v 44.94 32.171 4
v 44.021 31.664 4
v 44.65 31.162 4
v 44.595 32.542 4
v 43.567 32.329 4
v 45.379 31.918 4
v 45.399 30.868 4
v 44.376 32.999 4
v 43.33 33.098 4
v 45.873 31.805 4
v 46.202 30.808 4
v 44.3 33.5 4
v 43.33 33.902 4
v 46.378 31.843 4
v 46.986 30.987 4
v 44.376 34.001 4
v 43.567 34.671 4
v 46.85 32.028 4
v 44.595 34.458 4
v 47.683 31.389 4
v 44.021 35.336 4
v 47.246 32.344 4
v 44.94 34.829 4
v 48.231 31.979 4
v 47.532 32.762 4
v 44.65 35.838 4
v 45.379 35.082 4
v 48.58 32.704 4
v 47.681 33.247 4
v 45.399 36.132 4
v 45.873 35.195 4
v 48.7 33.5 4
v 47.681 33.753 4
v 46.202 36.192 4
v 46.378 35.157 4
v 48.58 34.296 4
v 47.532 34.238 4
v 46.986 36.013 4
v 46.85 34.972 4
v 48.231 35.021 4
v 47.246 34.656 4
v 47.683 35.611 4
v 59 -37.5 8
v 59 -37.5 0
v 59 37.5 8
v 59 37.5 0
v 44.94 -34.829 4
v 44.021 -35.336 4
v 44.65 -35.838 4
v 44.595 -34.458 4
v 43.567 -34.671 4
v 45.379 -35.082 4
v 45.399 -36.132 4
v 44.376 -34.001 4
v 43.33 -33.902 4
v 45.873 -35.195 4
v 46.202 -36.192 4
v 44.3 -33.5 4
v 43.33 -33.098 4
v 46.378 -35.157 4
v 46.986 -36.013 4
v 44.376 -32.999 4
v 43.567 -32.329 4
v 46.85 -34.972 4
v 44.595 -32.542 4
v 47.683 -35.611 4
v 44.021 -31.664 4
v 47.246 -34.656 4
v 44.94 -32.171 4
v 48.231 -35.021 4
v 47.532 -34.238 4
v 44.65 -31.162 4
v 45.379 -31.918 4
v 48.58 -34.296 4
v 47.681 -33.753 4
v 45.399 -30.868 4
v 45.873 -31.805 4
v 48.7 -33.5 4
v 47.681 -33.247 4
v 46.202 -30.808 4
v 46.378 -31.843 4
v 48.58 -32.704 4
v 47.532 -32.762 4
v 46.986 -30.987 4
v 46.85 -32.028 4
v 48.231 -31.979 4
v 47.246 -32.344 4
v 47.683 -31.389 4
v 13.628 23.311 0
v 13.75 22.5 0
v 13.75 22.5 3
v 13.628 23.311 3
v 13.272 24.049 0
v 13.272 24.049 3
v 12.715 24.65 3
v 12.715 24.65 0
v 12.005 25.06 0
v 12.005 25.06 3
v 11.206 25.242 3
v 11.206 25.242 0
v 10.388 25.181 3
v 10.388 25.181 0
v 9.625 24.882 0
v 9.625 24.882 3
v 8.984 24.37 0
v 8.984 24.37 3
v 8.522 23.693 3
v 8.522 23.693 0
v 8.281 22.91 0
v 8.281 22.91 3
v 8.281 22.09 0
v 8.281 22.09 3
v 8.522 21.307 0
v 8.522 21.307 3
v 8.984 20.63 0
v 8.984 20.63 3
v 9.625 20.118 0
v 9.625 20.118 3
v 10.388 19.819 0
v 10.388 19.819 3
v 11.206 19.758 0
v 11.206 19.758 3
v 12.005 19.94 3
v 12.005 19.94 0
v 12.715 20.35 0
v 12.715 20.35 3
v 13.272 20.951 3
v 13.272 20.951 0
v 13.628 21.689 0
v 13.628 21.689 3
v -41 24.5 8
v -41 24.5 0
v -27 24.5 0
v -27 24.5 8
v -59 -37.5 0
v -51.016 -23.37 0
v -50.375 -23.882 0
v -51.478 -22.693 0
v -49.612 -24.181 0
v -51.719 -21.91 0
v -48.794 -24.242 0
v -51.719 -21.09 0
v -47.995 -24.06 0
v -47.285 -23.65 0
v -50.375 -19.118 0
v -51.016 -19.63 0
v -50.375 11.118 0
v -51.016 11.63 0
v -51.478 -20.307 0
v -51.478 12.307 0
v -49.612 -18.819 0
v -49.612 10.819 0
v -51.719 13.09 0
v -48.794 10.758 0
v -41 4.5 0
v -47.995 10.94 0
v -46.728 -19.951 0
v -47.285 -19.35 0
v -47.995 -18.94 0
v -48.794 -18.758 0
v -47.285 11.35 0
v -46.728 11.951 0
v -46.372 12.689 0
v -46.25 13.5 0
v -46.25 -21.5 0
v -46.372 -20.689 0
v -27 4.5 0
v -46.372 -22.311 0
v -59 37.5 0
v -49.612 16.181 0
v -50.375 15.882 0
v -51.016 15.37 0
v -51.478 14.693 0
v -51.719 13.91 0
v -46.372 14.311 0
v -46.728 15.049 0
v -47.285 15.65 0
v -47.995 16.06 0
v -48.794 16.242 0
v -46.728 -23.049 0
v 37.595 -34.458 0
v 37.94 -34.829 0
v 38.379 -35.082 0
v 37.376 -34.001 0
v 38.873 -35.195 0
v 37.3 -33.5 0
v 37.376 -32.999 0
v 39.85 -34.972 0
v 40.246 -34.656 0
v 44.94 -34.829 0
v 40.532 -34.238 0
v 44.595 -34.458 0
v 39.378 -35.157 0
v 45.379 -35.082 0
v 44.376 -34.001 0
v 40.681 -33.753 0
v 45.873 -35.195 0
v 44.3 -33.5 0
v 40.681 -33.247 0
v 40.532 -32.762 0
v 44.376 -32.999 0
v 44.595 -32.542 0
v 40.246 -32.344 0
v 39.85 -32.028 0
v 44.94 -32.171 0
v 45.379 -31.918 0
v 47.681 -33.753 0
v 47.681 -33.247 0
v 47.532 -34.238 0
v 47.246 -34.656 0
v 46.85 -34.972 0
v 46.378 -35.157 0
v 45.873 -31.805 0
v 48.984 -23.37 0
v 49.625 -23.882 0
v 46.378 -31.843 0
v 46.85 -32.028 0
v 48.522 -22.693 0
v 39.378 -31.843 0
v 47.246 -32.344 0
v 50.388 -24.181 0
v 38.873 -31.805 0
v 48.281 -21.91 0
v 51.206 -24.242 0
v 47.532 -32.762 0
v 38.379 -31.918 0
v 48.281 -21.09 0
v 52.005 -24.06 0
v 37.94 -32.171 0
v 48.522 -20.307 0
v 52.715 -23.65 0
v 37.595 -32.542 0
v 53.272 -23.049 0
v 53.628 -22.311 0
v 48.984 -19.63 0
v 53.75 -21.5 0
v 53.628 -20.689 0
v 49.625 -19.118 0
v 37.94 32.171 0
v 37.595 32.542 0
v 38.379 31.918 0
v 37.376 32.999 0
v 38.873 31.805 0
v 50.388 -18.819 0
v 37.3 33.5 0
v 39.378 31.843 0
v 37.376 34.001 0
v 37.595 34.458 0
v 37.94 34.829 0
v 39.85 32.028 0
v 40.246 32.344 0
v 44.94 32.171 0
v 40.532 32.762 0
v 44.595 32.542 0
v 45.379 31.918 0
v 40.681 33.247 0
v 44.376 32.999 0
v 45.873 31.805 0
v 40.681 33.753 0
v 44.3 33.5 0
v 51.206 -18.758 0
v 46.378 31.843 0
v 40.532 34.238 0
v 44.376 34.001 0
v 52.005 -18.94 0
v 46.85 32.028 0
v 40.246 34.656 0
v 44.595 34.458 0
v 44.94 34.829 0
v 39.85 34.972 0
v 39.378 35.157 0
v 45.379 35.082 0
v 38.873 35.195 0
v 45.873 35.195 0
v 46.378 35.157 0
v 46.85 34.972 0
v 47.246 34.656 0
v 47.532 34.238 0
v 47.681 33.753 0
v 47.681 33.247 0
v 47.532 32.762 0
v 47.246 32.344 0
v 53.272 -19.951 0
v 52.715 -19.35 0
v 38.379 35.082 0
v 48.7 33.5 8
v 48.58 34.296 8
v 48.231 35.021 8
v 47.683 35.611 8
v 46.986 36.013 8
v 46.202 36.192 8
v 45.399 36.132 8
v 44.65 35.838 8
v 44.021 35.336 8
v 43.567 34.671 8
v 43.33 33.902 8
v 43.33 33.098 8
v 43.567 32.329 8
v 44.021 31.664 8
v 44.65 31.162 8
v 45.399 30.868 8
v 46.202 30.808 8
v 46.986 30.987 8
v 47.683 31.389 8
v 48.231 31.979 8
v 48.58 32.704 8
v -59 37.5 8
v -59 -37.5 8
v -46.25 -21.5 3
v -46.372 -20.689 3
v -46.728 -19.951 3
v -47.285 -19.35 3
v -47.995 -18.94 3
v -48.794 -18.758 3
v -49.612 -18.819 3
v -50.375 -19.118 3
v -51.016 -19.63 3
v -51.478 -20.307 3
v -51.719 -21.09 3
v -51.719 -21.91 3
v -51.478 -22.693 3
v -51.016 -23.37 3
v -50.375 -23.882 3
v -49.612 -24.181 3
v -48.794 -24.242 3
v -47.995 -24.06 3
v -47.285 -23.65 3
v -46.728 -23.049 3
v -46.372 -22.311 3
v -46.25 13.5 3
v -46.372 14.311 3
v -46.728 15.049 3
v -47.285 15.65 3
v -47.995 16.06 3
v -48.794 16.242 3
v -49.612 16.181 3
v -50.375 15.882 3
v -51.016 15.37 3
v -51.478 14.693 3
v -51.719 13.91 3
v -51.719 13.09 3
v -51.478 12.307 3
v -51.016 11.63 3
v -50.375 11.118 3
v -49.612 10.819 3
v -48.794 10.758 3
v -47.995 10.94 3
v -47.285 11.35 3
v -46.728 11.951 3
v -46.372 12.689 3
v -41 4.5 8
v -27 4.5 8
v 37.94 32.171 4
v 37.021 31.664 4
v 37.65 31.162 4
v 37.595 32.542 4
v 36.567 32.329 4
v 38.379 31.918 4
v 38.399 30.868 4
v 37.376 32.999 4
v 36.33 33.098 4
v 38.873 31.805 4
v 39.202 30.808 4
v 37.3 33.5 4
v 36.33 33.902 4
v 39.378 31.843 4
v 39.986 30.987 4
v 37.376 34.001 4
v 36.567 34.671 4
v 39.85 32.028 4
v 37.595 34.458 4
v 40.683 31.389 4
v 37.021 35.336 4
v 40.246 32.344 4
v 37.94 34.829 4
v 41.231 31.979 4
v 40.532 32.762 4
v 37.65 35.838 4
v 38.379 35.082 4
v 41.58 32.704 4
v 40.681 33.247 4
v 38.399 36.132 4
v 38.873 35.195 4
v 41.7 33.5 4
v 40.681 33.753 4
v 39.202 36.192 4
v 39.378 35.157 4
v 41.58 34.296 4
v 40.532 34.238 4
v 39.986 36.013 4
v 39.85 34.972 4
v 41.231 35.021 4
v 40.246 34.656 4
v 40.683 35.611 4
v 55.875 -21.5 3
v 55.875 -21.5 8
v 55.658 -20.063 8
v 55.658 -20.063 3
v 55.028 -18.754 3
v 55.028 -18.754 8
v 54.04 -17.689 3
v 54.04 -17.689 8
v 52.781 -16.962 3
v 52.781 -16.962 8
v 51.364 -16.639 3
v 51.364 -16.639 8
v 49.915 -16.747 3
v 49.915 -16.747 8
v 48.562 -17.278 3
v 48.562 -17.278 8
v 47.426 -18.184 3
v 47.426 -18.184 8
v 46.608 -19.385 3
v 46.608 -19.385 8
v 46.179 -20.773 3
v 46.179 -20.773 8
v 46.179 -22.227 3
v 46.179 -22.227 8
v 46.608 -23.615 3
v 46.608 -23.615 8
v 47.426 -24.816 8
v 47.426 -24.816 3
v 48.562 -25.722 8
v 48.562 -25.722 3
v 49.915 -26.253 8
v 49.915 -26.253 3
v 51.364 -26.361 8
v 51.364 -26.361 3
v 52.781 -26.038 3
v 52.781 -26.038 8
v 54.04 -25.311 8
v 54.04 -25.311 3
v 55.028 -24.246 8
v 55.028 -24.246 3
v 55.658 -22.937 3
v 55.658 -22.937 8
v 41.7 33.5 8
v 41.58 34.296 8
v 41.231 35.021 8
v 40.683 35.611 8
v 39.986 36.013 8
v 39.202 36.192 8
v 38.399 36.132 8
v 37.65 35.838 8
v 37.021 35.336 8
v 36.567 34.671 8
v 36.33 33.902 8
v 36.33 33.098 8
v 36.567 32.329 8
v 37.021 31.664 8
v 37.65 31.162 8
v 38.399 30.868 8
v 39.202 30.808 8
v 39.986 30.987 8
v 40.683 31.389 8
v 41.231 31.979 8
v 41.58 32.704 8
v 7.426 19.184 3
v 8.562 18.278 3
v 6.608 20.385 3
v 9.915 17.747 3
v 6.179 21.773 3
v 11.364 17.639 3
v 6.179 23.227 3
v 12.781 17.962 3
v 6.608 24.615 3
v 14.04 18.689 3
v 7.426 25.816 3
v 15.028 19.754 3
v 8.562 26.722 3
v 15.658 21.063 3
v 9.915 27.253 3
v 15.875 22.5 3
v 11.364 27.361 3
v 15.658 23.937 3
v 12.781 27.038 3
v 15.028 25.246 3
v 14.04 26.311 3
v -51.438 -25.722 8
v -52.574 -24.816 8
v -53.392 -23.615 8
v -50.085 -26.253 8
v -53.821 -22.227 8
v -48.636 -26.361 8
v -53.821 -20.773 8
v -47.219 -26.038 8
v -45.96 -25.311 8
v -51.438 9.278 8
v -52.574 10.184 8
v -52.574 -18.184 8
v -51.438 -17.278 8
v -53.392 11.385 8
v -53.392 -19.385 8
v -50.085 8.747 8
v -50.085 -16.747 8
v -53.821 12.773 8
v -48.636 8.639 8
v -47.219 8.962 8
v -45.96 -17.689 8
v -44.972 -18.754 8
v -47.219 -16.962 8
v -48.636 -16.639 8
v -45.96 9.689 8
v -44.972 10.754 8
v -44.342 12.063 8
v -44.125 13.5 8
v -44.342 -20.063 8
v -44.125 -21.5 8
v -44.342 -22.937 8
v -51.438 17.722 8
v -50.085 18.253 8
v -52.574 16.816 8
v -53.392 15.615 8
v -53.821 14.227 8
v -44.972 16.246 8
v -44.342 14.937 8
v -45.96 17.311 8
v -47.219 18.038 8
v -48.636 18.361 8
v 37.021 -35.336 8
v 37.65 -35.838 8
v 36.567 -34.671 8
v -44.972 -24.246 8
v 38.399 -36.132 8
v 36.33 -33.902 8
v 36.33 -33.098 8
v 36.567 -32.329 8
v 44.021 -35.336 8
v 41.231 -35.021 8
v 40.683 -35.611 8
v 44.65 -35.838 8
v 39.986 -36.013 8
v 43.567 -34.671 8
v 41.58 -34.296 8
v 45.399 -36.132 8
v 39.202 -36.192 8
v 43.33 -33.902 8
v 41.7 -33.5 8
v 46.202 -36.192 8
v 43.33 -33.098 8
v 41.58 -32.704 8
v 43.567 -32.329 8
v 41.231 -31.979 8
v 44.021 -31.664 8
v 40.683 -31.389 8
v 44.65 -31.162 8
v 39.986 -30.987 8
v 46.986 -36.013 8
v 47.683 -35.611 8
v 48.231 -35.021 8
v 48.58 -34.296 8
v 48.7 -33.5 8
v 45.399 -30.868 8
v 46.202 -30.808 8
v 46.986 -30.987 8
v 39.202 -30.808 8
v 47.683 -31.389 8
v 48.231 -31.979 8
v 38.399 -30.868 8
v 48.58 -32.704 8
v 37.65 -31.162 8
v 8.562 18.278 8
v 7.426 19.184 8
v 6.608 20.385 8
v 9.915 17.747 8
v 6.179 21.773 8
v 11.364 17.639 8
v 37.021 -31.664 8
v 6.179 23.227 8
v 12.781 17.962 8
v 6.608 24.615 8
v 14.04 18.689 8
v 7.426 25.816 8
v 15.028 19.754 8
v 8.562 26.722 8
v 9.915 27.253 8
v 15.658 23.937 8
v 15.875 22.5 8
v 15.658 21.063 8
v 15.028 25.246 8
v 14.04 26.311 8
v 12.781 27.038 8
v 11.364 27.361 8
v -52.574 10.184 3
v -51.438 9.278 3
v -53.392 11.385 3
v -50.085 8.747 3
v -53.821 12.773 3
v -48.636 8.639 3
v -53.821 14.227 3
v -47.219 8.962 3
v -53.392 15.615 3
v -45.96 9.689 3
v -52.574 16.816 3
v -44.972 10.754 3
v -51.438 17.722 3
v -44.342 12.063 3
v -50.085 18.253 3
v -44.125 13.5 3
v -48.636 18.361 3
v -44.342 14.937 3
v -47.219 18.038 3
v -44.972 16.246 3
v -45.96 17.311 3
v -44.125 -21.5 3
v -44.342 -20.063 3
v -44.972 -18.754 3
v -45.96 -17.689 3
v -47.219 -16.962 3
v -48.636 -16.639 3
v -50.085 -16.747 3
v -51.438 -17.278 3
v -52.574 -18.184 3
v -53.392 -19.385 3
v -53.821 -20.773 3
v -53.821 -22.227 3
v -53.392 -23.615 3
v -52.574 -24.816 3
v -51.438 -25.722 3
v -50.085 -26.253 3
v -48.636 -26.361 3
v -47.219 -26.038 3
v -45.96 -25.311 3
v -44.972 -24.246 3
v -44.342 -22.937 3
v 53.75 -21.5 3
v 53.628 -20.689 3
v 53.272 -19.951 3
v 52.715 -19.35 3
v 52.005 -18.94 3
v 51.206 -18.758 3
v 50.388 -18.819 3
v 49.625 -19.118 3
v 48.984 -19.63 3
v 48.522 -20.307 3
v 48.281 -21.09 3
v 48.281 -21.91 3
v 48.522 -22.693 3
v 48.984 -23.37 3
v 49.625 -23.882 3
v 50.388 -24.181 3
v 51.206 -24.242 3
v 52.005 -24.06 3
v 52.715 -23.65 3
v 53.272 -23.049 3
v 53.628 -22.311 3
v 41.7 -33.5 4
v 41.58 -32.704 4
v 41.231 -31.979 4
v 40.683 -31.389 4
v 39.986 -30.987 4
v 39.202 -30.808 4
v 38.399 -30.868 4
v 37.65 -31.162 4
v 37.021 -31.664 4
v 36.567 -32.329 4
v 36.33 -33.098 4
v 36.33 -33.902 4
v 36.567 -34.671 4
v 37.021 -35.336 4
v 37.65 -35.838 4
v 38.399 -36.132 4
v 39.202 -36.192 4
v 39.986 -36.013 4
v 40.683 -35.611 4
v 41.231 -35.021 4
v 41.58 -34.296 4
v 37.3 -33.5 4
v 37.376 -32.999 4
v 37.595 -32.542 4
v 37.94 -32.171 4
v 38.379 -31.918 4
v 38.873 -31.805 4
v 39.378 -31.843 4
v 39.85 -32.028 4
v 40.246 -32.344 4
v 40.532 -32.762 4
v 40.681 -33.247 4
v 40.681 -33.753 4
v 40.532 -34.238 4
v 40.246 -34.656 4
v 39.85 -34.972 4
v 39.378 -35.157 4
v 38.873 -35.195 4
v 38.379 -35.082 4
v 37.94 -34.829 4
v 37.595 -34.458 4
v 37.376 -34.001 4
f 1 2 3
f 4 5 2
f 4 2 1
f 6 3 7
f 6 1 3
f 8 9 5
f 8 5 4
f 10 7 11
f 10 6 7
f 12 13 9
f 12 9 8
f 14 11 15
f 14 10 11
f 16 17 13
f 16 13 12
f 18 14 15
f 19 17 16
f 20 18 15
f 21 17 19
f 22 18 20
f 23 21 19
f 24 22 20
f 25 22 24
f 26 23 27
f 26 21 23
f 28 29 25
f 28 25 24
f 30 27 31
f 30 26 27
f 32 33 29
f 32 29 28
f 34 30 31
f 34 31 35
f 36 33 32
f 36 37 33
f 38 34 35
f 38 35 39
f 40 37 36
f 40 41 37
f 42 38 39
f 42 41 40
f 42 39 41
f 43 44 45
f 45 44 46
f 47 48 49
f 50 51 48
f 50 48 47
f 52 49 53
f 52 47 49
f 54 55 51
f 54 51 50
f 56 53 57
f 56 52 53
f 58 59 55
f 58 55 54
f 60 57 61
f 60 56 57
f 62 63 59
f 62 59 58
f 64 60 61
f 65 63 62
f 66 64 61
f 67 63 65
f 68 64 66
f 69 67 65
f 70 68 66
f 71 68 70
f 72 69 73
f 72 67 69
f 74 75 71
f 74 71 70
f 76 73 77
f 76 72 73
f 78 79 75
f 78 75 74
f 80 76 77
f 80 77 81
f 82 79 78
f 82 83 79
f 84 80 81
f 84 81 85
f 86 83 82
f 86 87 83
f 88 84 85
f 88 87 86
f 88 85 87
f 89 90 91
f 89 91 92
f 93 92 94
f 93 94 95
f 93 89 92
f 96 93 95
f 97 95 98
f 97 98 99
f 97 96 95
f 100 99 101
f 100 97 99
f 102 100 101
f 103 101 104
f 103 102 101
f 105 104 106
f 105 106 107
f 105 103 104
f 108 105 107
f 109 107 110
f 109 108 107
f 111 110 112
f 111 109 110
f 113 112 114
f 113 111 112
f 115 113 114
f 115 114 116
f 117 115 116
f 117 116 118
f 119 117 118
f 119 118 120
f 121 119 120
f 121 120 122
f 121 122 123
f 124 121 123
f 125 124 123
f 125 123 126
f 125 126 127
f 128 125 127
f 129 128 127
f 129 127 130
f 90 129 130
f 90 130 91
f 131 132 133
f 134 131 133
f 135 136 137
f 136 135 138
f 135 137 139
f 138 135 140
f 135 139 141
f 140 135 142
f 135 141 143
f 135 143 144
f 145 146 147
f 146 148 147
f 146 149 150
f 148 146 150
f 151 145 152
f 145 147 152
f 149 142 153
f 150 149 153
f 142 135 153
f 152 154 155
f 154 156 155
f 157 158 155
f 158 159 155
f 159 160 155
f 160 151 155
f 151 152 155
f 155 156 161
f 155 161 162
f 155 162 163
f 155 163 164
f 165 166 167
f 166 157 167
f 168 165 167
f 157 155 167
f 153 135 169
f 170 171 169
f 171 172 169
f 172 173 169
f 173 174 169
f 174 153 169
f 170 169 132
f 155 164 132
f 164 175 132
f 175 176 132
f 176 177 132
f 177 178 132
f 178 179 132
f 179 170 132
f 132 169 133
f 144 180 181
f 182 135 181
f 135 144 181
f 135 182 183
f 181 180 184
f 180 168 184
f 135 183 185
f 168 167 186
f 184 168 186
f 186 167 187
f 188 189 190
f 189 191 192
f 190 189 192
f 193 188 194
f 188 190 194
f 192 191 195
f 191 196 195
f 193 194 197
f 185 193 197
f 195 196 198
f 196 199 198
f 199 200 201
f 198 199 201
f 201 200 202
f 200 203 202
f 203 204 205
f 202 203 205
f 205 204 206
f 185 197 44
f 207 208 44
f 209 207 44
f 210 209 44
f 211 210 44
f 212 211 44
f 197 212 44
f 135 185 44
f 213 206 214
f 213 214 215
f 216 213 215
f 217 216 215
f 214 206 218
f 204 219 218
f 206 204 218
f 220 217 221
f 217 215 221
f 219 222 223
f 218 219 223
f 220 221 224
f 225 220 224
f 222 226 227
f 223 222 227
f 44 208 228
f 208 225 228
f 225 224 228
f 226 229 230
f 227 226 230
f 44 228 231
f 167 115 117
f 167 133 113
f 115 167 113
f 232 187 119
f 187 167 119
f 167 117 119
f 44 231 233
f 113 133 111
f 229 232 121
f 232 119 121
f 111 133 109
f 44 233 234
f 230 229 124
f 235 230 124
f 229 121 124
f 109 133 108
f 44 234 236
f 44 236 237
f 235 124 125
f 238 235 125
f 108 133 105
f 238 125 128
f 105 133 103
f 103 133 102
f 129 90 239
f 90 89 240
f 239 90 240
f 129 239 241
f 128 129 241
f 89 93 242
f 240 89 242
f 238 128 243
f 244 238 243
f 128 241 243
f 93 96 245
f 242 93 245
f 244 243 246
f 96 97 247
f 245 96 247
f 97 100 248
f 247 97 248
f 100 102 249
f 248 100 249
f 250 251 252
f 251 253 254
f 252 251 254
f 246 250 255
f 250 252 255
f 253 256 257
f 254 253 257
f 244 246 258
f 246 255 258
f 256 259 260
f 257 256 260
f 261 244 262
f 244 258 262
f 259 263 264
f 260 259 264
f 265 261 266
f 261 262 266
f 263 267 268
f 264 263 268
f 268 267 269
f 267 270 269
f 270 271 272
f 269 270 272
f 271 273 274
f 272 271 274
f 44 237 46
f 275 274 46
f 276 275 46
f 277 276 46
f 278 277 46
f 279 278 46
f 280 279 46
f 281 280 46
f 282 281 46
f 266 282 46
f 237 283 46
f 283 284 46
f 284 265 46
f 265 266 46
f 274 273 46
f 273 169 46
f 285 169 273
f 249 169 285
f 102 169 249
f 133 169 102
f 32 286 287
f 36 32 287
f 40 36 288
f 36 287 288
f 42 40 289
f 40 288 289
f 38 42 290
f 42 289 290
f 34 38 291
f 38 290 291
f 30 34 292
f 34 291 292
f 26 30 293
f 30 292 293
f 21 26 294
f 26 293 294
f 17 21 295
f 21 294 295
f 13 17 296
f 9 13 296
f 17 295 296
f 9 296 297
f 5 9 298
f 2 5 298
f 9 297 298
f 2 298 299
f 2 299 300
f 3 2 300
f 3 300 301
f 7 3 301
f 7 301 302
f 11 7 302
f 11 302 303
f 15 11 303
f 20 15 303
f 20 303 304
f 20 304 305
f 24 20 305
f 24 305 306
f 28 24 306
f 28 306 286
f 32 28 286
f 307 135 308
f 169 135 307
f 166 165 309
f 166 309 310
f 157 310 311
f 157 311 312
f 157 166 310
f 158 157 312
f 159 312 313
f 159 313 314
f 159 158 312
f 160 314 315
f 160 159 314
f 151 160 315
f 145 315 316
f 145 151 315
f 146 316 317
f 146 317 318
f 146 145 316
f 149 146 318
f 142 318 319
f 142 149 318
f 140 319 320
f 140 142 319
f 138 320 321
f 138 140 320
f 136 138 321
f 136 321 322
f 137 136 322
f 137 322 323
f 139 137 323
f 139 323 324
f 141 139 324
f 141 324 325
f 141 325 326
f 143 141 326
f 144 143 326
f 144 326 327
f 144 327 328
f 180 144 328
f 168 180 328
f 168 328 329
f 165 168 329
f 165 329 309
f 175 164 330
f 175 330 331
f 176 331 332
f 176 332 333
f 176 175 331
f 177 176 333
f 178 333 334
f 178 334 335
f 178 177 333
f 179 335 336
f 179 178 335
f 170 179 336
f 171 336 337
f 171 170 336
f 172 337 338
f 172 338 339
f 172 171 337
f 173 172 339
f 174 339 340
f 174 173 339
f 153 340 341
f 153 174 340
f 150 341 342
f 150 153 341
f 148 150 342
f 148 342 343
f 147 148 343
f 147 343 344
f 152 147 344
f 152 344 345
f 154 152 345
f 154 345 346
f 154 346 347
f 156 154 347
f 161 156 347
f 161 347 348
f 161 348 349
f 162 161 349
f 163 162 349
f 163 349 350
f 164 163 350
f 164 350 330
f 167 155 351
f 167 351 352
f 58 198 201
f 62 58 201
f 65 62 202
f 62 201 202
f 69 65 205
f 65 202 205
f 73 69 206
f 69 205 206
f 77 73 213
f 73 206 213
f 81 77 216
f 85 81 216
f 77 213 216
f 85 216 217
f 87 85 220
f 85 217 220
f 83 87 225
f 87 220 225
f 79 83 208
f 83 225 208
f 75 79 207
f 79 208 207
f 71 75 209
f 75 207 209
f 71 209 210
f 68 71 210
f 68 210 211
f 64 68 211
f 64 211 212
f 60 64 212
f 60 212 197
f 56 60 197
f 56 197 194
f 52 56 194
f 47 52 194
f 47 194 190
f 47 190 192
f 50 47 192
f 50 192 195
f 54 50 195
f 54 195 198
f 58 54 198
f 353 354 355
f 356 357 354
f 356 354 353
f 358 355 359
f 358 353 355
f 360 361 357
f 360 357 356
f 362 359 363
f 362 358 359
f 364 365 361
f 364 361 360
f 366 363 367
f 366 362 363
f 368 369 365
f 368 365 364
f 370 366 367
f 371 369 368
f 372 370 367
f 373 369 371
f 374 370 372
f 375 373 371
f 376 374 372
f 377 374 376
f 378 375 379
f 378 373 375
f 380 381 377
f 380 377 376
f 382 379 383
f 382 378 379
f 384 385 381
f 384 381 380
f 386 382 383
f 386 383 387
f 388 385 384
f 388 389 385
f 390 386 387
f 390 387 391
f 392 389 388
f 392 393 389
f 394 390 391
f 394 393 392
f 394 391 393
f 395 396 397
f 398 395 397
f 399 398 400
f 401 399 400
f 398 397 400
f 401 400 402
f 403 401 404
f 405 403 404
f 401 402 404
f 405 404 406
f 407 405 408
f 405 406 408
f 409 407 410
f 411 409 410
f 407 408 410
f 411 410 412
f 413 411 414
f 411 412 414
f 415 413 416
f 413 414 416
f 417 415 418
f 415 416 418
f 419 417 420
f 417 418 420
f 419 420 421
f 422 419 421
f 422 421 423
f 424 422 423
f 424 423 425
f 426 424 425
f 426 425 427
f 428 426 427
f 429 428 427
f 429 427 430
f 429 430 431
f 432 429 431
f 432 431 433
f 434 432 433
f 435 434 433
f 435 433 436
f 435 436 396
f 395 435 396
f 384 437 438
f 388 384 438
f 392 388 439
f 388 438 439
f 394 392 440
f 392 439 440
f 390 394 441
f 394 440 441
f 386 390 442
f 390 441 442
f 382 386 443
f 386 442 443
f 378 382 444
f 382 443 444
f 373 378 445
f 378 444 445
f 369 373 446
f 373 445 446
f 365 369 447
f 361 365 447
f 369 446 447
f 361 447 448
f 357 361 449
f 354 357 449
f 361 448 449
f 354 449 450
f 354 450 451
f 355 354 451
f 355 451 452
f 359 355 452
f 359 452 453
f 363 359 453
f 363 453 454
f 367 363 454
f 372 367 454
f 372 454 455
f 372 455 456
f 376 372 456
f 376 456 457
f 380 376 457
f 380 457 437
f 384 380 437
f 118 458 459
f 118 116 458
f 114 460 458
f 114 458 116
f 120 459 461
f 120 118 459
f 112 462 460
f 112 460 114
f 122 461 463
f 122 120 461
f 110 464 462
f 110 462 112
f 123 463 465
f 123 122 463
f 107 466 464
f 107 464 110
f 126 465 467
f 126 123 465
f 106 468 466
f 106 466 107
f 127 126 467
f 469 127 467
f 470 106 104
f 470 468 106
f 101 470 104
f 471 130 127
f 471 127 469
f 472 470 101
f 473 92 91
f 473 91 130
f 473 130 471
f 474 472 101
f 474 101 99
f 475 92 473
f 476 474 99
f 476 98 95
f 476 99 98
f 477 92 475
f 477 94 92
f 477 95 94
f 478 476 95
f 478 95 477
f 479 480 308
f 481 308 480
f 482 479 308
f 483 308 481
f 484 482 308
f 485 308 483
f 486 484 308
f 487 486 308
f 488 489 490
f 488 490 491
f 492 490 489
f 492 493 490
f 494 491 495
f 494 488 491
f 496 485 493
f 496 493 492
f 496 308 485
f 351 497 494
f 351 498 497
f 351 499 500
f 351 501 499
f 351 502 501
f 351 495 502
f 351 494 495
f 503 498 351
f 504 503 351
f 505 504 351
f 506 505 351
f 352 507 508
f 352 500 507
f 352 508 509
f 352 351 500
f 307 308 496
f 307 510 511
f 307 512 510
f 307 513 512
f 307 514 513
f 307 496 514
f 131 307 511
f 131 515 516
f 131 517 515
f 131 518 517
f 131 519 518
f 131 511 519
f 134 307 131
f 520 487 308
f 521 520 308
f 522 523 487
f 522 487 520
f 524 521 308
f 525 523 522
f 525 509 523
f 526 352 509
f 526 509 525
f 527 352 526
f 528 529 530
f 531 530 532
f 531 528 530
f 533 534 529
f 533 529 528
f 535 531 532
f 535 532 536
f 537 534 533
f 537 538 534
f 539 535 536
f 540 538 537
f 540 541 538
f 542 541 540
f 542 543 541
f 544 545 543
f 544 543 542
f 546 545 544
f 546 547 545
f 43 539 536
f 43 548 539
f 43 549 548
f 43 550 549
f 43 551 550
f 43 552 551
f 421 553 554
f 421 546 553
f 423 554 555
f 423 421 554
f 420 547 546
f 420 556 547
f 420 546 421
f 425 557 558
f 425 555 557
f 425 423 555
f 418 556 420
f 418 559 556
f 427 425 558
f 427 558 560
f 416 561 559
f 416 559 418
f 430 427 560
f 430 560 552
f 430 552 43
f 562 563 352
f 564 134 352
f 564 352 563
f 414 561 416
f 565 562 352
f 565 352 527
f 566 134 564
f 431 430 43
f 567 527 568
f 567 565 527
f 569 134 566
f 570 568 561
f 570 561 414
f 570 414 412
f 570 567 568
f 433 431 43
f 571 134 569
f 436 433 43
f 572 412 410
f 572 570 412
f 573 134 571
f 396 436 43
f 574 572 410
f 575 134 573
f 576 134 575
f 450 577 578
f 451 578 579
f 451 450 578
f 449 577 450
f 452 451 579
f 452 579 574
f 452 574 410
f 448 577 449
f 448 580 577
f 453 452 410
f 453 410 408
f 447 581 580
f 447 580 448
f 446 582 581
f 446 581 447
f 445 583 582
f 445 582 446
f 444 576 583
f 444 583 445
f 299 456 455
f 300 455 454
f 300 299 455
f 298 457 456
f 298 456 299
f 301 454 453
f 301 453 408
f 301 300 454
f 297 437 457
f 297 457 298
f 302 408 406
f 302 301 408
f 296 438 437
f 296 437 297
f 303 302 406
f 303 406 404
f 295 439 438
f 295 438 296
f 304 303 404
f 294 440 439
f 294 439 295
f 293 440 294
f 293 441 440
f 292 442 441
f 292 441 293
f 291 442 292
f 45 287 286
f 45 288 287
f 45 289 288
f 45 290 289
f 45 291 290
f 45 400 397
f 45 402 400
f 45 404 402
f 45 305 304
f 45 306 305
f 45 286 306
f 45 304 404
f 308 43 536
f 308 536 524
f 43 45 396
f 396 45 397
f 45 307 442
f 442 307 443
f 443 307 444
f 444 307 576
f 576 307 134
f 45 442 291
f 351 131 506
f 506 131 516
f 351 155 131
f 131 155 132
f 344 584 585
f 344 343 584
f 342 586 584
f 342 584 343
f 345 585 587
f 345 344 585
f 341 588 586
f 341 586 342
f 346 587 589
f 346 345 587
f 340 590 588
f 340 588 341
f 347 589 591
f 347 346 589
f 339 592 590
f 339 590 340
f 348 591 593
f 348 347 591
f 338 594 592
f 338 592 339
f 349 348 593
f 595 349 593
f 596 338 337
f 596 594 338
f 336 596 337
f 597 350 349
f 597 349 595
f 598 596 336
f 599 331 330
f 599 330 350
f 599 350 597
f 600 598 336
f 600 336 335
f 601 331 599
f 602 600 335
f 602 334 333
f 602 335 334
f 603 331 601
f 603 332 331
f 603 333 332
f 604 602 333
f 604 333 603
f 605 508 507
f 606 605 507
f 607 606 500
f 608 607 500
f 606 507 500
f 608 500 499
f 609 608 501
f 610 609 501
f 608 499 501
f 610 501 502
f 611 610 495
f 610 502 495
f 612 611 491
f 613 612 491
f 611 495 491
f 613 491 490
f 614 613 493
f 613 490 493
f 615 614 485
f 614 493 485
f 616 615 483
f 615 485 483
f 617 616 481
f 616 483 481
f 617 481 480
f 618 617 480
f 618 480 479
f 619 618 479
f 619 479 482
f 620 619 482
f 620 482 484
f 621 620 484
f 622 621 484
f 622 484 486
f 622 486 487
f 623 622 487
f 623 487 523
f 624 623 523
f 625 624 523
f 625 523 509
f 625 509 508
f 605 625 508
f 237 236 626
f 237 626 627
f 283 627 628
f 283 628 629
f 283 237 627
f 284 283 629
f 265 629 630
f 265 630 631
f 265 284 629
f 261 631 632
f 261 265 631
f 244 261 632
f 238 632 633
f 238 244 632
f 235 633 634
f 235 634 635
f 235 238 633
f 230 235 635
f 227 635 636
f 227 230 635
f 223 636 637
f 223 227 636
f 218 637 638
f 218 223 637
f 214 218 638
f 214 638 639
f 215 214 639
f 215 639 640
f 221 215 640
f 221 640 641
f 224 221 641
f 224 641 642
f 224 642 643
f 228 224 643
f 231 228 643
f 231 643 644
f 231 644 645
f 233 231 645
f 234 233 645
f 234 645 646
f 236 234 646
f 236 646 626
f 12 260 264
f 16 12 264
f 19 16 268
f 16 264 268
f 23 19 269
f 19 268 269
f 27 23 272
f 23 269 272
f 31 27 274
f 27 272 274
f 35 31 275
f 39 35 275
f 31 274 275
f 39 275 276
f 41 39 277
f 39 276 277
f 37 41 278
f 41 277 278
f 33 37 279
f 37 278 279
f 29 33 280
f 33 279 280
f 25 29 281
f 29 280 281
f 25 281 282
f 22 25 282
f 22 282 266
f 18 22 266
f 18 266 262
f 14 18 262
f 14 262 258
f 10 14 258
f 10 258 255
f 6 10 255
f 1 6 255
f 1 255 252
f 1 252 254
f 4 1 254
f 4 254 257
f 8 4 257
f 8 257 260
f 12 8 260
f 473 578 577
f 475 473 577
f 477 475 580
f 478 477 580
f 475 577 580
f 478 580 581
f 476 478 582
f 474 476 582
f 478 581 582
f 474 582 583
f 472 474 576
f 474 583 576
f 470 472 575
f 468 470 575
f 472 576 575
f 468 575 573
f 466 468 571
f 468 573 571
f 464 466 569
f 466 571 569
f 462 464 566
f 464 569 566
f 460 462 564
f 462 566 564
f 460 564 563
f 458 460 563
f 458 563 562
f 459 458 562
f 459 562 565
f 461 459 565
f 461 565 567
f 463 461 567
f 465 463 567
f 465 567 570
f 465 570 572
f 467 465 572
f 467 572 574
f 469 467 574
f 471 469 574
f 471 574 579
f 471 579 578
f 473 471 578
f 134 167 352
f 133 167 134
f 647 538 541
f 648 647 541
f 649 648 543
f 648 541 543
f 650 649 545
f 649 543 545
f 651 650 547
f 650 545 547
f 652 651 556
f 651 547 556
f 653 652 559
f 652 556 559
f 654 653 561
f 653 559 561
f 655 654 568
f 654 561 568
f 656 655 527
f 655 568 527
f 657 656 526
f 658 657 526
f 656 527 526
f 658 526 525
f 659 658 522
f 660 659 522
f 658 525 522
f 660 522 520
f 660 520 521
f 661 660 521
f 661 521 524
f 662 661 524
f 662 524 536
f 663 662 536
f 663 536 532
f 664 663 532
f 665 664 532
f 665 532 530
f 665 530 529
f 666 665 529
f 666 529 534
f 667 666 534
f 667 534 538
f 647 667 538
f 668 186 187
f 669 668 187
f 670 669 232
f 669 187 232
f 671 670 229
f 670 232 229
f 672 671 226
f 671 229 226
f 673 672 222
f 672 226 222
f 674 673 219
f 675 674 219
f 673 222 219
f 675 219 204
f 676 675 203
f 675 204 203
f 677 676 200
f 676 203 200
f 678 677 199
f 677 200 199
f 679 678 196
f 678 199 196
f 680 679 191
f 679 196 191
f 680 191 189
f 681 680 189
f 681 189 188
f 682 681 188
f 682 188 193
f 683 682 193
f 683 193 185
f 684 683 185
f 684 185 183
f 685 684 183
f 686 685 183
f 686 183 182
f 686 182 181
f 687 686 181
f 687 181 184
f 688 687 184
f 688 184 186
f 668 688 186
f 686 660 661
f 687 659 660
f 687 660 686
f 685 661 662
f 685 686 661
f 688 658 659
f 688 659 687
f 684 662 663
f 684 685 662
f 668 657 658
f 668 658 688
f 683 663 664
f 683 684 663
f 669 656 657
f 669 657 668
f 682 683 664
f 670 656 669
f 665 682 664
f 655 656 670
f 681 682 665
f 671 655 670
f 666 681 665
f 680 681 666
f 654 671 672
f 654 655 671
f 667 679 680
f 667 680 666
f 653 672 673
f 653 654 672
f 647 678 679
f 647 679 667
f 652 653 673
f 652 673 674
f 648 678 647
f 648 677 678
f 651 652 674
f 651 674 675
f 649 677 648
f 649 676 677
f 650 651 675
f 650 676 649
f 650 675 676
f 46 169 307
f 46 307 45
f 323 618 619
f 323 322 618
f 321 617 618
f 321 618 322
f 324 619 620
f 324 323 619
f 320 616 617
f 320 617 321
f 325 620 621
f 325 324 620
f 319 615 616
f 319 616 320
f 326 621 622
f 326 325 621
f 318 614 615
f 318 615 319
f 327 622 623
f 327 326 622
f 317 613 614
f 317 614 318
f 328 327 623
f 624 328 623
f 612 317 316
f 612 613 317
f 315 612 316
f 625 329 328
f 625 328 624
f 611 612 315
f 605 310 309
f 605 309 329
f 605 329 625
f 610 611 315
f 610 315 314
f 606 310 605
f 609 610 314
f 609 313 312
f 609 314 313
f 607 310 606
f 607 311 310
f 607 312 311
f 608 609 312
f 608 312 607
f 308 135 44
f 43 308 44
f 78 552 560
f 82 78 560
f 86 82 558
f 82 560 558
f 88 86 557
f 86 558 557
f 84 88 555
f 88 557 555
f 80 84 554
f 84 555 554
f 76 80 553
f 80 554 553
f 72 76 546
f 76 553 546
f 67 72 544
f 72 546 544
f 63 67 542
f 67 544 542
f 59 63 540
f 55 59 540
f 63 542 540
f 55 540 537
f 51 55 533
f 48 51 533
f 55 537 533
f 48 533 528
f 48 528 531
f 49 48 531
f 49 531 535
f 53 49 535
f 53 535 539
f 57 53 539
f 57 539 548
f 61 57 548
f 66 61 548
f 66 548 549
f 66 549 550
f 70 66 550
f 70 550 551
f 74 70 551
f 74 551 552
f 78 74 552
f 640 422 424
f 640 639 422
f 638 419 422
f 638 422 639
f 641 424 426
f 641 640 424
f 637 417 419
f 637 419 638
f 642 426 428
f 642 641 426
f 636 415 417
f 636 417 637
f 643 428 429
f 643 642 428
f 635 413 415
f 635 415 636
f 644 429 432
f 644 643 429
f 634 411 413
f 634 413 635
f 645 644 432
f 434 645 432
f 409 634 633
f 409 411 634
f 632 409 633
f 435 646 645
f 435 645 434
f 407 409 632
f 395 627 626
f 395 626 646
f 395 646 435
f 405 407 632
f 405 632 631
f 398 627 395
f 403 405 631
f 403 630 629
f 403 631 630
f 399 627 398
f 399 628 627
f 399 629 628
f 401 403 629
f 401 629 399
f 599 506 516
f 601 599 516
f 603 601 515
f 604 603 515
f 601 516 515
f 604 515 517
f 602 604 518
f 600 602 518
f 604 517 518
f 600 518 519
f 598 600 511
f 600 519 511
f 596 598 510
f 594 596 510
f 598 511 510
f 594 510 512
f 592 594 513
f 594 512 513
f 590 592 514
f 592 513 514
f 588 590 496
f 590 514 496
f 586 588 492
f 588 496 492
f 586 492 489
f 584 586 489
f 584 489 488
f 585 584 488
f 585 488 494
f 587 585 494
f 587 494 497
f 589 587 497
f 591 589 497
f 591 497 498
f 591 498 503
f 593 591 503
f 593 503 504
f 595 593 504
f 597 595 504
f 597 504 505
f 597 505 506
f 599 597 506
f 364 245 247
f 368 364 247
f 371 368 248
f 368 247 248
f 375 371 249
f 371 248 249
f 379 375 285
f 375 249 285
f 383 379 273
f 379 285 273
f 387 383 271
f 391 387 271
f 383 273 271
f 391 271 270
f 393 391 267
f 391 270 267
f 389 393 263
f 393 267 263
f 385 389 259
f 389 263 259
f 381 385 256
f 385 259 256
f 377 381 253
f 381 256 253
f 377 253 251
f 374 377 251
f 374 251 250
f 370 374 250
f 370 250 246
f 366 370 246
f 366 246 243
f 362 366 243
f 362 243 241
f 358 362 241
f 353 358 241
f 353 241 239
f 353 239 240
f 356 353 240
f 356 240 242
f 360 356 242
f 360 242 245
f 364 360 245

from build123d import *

# Parameters (mm, degrees)
F0_W           = 118
F0_H           = 75
F0_R           = 2.75
F0_R_2         = 1.6
F0_W_2         = 14
F0_H_2         = 20
F1_DEPTH       = 8
F3_D           = 5.5
F3_DEPTH       = 8
F3_CBORE_D     = 9.75
F3_CBORE_DEPTH = 5
F4_D           = 3.4
F4_DEPTH       = 8
F4_CBORE_D     = 5.4
F4_CBORE_DEPTH = 4


with BuildPart() as f1:
    # F0 (on Top) → F1 (new body)
    with BuildSketch(Plane.XY):
        Rectangle(F0_W, F0_H)
        with Locations((-49, -21.5)):
            Circle(F0_R, mode=Mode.SUBTRACT)
        with Locations((39, -33.5)):
            Circle(F0_R_2, mode=Mode.SUBTRACT)
        with Locations((46, -33.5)):
            Circle(F0_R_2, mode=Mode.SUBTRACT)
        with Locations((51, -21.5)):
            Circle(F0_R, mode=Mode.SUBTRACT)
        with Locations((-49, 13.5)):
            Circle(F0_R, mode=Mode.SUBTRACT)
        with Locations((-34, 14.5)):
            Rectangle(F0_W_2, F0_H_2, mode=Mode.SUBTRACT)
        with Locations((11, 22.5)):
            Circle(F0_R, mode=Mode.SUBTRACT)
        with Locations((39, 33.5)):
            Circle(F0_R_2, mode=Mode.SUBTRACT)
        with Locations((46, 33.5)):
            Circle(F0_R_2, mode=Mode.SUBTRACT)
    extrude(amount=F1_DEPTH)

    # F3
    with Locations(Plane.XY.offset(8)):
        with Locations((-49, 13.5), (11, 22.5), (51, -21.5), (-49, -21.5)):
            CounterBoreHole(F3_D / 2, F3_CBORE_D / 2, F3_CBORE_DEPTH, depth=F3_DEPTH)

    # F4
    with Locations(Plane.XY.offset(8)):
        with Locations((39, -33.5), (46, -33.5), (39, 33.5), (46, 33.5)):
            CounterBoreHole(F4_D / 2, F4_CBORE_D / 2, F4_CBORE_DEPTH, depth=F4_DEPTH)


solid = f1.part
